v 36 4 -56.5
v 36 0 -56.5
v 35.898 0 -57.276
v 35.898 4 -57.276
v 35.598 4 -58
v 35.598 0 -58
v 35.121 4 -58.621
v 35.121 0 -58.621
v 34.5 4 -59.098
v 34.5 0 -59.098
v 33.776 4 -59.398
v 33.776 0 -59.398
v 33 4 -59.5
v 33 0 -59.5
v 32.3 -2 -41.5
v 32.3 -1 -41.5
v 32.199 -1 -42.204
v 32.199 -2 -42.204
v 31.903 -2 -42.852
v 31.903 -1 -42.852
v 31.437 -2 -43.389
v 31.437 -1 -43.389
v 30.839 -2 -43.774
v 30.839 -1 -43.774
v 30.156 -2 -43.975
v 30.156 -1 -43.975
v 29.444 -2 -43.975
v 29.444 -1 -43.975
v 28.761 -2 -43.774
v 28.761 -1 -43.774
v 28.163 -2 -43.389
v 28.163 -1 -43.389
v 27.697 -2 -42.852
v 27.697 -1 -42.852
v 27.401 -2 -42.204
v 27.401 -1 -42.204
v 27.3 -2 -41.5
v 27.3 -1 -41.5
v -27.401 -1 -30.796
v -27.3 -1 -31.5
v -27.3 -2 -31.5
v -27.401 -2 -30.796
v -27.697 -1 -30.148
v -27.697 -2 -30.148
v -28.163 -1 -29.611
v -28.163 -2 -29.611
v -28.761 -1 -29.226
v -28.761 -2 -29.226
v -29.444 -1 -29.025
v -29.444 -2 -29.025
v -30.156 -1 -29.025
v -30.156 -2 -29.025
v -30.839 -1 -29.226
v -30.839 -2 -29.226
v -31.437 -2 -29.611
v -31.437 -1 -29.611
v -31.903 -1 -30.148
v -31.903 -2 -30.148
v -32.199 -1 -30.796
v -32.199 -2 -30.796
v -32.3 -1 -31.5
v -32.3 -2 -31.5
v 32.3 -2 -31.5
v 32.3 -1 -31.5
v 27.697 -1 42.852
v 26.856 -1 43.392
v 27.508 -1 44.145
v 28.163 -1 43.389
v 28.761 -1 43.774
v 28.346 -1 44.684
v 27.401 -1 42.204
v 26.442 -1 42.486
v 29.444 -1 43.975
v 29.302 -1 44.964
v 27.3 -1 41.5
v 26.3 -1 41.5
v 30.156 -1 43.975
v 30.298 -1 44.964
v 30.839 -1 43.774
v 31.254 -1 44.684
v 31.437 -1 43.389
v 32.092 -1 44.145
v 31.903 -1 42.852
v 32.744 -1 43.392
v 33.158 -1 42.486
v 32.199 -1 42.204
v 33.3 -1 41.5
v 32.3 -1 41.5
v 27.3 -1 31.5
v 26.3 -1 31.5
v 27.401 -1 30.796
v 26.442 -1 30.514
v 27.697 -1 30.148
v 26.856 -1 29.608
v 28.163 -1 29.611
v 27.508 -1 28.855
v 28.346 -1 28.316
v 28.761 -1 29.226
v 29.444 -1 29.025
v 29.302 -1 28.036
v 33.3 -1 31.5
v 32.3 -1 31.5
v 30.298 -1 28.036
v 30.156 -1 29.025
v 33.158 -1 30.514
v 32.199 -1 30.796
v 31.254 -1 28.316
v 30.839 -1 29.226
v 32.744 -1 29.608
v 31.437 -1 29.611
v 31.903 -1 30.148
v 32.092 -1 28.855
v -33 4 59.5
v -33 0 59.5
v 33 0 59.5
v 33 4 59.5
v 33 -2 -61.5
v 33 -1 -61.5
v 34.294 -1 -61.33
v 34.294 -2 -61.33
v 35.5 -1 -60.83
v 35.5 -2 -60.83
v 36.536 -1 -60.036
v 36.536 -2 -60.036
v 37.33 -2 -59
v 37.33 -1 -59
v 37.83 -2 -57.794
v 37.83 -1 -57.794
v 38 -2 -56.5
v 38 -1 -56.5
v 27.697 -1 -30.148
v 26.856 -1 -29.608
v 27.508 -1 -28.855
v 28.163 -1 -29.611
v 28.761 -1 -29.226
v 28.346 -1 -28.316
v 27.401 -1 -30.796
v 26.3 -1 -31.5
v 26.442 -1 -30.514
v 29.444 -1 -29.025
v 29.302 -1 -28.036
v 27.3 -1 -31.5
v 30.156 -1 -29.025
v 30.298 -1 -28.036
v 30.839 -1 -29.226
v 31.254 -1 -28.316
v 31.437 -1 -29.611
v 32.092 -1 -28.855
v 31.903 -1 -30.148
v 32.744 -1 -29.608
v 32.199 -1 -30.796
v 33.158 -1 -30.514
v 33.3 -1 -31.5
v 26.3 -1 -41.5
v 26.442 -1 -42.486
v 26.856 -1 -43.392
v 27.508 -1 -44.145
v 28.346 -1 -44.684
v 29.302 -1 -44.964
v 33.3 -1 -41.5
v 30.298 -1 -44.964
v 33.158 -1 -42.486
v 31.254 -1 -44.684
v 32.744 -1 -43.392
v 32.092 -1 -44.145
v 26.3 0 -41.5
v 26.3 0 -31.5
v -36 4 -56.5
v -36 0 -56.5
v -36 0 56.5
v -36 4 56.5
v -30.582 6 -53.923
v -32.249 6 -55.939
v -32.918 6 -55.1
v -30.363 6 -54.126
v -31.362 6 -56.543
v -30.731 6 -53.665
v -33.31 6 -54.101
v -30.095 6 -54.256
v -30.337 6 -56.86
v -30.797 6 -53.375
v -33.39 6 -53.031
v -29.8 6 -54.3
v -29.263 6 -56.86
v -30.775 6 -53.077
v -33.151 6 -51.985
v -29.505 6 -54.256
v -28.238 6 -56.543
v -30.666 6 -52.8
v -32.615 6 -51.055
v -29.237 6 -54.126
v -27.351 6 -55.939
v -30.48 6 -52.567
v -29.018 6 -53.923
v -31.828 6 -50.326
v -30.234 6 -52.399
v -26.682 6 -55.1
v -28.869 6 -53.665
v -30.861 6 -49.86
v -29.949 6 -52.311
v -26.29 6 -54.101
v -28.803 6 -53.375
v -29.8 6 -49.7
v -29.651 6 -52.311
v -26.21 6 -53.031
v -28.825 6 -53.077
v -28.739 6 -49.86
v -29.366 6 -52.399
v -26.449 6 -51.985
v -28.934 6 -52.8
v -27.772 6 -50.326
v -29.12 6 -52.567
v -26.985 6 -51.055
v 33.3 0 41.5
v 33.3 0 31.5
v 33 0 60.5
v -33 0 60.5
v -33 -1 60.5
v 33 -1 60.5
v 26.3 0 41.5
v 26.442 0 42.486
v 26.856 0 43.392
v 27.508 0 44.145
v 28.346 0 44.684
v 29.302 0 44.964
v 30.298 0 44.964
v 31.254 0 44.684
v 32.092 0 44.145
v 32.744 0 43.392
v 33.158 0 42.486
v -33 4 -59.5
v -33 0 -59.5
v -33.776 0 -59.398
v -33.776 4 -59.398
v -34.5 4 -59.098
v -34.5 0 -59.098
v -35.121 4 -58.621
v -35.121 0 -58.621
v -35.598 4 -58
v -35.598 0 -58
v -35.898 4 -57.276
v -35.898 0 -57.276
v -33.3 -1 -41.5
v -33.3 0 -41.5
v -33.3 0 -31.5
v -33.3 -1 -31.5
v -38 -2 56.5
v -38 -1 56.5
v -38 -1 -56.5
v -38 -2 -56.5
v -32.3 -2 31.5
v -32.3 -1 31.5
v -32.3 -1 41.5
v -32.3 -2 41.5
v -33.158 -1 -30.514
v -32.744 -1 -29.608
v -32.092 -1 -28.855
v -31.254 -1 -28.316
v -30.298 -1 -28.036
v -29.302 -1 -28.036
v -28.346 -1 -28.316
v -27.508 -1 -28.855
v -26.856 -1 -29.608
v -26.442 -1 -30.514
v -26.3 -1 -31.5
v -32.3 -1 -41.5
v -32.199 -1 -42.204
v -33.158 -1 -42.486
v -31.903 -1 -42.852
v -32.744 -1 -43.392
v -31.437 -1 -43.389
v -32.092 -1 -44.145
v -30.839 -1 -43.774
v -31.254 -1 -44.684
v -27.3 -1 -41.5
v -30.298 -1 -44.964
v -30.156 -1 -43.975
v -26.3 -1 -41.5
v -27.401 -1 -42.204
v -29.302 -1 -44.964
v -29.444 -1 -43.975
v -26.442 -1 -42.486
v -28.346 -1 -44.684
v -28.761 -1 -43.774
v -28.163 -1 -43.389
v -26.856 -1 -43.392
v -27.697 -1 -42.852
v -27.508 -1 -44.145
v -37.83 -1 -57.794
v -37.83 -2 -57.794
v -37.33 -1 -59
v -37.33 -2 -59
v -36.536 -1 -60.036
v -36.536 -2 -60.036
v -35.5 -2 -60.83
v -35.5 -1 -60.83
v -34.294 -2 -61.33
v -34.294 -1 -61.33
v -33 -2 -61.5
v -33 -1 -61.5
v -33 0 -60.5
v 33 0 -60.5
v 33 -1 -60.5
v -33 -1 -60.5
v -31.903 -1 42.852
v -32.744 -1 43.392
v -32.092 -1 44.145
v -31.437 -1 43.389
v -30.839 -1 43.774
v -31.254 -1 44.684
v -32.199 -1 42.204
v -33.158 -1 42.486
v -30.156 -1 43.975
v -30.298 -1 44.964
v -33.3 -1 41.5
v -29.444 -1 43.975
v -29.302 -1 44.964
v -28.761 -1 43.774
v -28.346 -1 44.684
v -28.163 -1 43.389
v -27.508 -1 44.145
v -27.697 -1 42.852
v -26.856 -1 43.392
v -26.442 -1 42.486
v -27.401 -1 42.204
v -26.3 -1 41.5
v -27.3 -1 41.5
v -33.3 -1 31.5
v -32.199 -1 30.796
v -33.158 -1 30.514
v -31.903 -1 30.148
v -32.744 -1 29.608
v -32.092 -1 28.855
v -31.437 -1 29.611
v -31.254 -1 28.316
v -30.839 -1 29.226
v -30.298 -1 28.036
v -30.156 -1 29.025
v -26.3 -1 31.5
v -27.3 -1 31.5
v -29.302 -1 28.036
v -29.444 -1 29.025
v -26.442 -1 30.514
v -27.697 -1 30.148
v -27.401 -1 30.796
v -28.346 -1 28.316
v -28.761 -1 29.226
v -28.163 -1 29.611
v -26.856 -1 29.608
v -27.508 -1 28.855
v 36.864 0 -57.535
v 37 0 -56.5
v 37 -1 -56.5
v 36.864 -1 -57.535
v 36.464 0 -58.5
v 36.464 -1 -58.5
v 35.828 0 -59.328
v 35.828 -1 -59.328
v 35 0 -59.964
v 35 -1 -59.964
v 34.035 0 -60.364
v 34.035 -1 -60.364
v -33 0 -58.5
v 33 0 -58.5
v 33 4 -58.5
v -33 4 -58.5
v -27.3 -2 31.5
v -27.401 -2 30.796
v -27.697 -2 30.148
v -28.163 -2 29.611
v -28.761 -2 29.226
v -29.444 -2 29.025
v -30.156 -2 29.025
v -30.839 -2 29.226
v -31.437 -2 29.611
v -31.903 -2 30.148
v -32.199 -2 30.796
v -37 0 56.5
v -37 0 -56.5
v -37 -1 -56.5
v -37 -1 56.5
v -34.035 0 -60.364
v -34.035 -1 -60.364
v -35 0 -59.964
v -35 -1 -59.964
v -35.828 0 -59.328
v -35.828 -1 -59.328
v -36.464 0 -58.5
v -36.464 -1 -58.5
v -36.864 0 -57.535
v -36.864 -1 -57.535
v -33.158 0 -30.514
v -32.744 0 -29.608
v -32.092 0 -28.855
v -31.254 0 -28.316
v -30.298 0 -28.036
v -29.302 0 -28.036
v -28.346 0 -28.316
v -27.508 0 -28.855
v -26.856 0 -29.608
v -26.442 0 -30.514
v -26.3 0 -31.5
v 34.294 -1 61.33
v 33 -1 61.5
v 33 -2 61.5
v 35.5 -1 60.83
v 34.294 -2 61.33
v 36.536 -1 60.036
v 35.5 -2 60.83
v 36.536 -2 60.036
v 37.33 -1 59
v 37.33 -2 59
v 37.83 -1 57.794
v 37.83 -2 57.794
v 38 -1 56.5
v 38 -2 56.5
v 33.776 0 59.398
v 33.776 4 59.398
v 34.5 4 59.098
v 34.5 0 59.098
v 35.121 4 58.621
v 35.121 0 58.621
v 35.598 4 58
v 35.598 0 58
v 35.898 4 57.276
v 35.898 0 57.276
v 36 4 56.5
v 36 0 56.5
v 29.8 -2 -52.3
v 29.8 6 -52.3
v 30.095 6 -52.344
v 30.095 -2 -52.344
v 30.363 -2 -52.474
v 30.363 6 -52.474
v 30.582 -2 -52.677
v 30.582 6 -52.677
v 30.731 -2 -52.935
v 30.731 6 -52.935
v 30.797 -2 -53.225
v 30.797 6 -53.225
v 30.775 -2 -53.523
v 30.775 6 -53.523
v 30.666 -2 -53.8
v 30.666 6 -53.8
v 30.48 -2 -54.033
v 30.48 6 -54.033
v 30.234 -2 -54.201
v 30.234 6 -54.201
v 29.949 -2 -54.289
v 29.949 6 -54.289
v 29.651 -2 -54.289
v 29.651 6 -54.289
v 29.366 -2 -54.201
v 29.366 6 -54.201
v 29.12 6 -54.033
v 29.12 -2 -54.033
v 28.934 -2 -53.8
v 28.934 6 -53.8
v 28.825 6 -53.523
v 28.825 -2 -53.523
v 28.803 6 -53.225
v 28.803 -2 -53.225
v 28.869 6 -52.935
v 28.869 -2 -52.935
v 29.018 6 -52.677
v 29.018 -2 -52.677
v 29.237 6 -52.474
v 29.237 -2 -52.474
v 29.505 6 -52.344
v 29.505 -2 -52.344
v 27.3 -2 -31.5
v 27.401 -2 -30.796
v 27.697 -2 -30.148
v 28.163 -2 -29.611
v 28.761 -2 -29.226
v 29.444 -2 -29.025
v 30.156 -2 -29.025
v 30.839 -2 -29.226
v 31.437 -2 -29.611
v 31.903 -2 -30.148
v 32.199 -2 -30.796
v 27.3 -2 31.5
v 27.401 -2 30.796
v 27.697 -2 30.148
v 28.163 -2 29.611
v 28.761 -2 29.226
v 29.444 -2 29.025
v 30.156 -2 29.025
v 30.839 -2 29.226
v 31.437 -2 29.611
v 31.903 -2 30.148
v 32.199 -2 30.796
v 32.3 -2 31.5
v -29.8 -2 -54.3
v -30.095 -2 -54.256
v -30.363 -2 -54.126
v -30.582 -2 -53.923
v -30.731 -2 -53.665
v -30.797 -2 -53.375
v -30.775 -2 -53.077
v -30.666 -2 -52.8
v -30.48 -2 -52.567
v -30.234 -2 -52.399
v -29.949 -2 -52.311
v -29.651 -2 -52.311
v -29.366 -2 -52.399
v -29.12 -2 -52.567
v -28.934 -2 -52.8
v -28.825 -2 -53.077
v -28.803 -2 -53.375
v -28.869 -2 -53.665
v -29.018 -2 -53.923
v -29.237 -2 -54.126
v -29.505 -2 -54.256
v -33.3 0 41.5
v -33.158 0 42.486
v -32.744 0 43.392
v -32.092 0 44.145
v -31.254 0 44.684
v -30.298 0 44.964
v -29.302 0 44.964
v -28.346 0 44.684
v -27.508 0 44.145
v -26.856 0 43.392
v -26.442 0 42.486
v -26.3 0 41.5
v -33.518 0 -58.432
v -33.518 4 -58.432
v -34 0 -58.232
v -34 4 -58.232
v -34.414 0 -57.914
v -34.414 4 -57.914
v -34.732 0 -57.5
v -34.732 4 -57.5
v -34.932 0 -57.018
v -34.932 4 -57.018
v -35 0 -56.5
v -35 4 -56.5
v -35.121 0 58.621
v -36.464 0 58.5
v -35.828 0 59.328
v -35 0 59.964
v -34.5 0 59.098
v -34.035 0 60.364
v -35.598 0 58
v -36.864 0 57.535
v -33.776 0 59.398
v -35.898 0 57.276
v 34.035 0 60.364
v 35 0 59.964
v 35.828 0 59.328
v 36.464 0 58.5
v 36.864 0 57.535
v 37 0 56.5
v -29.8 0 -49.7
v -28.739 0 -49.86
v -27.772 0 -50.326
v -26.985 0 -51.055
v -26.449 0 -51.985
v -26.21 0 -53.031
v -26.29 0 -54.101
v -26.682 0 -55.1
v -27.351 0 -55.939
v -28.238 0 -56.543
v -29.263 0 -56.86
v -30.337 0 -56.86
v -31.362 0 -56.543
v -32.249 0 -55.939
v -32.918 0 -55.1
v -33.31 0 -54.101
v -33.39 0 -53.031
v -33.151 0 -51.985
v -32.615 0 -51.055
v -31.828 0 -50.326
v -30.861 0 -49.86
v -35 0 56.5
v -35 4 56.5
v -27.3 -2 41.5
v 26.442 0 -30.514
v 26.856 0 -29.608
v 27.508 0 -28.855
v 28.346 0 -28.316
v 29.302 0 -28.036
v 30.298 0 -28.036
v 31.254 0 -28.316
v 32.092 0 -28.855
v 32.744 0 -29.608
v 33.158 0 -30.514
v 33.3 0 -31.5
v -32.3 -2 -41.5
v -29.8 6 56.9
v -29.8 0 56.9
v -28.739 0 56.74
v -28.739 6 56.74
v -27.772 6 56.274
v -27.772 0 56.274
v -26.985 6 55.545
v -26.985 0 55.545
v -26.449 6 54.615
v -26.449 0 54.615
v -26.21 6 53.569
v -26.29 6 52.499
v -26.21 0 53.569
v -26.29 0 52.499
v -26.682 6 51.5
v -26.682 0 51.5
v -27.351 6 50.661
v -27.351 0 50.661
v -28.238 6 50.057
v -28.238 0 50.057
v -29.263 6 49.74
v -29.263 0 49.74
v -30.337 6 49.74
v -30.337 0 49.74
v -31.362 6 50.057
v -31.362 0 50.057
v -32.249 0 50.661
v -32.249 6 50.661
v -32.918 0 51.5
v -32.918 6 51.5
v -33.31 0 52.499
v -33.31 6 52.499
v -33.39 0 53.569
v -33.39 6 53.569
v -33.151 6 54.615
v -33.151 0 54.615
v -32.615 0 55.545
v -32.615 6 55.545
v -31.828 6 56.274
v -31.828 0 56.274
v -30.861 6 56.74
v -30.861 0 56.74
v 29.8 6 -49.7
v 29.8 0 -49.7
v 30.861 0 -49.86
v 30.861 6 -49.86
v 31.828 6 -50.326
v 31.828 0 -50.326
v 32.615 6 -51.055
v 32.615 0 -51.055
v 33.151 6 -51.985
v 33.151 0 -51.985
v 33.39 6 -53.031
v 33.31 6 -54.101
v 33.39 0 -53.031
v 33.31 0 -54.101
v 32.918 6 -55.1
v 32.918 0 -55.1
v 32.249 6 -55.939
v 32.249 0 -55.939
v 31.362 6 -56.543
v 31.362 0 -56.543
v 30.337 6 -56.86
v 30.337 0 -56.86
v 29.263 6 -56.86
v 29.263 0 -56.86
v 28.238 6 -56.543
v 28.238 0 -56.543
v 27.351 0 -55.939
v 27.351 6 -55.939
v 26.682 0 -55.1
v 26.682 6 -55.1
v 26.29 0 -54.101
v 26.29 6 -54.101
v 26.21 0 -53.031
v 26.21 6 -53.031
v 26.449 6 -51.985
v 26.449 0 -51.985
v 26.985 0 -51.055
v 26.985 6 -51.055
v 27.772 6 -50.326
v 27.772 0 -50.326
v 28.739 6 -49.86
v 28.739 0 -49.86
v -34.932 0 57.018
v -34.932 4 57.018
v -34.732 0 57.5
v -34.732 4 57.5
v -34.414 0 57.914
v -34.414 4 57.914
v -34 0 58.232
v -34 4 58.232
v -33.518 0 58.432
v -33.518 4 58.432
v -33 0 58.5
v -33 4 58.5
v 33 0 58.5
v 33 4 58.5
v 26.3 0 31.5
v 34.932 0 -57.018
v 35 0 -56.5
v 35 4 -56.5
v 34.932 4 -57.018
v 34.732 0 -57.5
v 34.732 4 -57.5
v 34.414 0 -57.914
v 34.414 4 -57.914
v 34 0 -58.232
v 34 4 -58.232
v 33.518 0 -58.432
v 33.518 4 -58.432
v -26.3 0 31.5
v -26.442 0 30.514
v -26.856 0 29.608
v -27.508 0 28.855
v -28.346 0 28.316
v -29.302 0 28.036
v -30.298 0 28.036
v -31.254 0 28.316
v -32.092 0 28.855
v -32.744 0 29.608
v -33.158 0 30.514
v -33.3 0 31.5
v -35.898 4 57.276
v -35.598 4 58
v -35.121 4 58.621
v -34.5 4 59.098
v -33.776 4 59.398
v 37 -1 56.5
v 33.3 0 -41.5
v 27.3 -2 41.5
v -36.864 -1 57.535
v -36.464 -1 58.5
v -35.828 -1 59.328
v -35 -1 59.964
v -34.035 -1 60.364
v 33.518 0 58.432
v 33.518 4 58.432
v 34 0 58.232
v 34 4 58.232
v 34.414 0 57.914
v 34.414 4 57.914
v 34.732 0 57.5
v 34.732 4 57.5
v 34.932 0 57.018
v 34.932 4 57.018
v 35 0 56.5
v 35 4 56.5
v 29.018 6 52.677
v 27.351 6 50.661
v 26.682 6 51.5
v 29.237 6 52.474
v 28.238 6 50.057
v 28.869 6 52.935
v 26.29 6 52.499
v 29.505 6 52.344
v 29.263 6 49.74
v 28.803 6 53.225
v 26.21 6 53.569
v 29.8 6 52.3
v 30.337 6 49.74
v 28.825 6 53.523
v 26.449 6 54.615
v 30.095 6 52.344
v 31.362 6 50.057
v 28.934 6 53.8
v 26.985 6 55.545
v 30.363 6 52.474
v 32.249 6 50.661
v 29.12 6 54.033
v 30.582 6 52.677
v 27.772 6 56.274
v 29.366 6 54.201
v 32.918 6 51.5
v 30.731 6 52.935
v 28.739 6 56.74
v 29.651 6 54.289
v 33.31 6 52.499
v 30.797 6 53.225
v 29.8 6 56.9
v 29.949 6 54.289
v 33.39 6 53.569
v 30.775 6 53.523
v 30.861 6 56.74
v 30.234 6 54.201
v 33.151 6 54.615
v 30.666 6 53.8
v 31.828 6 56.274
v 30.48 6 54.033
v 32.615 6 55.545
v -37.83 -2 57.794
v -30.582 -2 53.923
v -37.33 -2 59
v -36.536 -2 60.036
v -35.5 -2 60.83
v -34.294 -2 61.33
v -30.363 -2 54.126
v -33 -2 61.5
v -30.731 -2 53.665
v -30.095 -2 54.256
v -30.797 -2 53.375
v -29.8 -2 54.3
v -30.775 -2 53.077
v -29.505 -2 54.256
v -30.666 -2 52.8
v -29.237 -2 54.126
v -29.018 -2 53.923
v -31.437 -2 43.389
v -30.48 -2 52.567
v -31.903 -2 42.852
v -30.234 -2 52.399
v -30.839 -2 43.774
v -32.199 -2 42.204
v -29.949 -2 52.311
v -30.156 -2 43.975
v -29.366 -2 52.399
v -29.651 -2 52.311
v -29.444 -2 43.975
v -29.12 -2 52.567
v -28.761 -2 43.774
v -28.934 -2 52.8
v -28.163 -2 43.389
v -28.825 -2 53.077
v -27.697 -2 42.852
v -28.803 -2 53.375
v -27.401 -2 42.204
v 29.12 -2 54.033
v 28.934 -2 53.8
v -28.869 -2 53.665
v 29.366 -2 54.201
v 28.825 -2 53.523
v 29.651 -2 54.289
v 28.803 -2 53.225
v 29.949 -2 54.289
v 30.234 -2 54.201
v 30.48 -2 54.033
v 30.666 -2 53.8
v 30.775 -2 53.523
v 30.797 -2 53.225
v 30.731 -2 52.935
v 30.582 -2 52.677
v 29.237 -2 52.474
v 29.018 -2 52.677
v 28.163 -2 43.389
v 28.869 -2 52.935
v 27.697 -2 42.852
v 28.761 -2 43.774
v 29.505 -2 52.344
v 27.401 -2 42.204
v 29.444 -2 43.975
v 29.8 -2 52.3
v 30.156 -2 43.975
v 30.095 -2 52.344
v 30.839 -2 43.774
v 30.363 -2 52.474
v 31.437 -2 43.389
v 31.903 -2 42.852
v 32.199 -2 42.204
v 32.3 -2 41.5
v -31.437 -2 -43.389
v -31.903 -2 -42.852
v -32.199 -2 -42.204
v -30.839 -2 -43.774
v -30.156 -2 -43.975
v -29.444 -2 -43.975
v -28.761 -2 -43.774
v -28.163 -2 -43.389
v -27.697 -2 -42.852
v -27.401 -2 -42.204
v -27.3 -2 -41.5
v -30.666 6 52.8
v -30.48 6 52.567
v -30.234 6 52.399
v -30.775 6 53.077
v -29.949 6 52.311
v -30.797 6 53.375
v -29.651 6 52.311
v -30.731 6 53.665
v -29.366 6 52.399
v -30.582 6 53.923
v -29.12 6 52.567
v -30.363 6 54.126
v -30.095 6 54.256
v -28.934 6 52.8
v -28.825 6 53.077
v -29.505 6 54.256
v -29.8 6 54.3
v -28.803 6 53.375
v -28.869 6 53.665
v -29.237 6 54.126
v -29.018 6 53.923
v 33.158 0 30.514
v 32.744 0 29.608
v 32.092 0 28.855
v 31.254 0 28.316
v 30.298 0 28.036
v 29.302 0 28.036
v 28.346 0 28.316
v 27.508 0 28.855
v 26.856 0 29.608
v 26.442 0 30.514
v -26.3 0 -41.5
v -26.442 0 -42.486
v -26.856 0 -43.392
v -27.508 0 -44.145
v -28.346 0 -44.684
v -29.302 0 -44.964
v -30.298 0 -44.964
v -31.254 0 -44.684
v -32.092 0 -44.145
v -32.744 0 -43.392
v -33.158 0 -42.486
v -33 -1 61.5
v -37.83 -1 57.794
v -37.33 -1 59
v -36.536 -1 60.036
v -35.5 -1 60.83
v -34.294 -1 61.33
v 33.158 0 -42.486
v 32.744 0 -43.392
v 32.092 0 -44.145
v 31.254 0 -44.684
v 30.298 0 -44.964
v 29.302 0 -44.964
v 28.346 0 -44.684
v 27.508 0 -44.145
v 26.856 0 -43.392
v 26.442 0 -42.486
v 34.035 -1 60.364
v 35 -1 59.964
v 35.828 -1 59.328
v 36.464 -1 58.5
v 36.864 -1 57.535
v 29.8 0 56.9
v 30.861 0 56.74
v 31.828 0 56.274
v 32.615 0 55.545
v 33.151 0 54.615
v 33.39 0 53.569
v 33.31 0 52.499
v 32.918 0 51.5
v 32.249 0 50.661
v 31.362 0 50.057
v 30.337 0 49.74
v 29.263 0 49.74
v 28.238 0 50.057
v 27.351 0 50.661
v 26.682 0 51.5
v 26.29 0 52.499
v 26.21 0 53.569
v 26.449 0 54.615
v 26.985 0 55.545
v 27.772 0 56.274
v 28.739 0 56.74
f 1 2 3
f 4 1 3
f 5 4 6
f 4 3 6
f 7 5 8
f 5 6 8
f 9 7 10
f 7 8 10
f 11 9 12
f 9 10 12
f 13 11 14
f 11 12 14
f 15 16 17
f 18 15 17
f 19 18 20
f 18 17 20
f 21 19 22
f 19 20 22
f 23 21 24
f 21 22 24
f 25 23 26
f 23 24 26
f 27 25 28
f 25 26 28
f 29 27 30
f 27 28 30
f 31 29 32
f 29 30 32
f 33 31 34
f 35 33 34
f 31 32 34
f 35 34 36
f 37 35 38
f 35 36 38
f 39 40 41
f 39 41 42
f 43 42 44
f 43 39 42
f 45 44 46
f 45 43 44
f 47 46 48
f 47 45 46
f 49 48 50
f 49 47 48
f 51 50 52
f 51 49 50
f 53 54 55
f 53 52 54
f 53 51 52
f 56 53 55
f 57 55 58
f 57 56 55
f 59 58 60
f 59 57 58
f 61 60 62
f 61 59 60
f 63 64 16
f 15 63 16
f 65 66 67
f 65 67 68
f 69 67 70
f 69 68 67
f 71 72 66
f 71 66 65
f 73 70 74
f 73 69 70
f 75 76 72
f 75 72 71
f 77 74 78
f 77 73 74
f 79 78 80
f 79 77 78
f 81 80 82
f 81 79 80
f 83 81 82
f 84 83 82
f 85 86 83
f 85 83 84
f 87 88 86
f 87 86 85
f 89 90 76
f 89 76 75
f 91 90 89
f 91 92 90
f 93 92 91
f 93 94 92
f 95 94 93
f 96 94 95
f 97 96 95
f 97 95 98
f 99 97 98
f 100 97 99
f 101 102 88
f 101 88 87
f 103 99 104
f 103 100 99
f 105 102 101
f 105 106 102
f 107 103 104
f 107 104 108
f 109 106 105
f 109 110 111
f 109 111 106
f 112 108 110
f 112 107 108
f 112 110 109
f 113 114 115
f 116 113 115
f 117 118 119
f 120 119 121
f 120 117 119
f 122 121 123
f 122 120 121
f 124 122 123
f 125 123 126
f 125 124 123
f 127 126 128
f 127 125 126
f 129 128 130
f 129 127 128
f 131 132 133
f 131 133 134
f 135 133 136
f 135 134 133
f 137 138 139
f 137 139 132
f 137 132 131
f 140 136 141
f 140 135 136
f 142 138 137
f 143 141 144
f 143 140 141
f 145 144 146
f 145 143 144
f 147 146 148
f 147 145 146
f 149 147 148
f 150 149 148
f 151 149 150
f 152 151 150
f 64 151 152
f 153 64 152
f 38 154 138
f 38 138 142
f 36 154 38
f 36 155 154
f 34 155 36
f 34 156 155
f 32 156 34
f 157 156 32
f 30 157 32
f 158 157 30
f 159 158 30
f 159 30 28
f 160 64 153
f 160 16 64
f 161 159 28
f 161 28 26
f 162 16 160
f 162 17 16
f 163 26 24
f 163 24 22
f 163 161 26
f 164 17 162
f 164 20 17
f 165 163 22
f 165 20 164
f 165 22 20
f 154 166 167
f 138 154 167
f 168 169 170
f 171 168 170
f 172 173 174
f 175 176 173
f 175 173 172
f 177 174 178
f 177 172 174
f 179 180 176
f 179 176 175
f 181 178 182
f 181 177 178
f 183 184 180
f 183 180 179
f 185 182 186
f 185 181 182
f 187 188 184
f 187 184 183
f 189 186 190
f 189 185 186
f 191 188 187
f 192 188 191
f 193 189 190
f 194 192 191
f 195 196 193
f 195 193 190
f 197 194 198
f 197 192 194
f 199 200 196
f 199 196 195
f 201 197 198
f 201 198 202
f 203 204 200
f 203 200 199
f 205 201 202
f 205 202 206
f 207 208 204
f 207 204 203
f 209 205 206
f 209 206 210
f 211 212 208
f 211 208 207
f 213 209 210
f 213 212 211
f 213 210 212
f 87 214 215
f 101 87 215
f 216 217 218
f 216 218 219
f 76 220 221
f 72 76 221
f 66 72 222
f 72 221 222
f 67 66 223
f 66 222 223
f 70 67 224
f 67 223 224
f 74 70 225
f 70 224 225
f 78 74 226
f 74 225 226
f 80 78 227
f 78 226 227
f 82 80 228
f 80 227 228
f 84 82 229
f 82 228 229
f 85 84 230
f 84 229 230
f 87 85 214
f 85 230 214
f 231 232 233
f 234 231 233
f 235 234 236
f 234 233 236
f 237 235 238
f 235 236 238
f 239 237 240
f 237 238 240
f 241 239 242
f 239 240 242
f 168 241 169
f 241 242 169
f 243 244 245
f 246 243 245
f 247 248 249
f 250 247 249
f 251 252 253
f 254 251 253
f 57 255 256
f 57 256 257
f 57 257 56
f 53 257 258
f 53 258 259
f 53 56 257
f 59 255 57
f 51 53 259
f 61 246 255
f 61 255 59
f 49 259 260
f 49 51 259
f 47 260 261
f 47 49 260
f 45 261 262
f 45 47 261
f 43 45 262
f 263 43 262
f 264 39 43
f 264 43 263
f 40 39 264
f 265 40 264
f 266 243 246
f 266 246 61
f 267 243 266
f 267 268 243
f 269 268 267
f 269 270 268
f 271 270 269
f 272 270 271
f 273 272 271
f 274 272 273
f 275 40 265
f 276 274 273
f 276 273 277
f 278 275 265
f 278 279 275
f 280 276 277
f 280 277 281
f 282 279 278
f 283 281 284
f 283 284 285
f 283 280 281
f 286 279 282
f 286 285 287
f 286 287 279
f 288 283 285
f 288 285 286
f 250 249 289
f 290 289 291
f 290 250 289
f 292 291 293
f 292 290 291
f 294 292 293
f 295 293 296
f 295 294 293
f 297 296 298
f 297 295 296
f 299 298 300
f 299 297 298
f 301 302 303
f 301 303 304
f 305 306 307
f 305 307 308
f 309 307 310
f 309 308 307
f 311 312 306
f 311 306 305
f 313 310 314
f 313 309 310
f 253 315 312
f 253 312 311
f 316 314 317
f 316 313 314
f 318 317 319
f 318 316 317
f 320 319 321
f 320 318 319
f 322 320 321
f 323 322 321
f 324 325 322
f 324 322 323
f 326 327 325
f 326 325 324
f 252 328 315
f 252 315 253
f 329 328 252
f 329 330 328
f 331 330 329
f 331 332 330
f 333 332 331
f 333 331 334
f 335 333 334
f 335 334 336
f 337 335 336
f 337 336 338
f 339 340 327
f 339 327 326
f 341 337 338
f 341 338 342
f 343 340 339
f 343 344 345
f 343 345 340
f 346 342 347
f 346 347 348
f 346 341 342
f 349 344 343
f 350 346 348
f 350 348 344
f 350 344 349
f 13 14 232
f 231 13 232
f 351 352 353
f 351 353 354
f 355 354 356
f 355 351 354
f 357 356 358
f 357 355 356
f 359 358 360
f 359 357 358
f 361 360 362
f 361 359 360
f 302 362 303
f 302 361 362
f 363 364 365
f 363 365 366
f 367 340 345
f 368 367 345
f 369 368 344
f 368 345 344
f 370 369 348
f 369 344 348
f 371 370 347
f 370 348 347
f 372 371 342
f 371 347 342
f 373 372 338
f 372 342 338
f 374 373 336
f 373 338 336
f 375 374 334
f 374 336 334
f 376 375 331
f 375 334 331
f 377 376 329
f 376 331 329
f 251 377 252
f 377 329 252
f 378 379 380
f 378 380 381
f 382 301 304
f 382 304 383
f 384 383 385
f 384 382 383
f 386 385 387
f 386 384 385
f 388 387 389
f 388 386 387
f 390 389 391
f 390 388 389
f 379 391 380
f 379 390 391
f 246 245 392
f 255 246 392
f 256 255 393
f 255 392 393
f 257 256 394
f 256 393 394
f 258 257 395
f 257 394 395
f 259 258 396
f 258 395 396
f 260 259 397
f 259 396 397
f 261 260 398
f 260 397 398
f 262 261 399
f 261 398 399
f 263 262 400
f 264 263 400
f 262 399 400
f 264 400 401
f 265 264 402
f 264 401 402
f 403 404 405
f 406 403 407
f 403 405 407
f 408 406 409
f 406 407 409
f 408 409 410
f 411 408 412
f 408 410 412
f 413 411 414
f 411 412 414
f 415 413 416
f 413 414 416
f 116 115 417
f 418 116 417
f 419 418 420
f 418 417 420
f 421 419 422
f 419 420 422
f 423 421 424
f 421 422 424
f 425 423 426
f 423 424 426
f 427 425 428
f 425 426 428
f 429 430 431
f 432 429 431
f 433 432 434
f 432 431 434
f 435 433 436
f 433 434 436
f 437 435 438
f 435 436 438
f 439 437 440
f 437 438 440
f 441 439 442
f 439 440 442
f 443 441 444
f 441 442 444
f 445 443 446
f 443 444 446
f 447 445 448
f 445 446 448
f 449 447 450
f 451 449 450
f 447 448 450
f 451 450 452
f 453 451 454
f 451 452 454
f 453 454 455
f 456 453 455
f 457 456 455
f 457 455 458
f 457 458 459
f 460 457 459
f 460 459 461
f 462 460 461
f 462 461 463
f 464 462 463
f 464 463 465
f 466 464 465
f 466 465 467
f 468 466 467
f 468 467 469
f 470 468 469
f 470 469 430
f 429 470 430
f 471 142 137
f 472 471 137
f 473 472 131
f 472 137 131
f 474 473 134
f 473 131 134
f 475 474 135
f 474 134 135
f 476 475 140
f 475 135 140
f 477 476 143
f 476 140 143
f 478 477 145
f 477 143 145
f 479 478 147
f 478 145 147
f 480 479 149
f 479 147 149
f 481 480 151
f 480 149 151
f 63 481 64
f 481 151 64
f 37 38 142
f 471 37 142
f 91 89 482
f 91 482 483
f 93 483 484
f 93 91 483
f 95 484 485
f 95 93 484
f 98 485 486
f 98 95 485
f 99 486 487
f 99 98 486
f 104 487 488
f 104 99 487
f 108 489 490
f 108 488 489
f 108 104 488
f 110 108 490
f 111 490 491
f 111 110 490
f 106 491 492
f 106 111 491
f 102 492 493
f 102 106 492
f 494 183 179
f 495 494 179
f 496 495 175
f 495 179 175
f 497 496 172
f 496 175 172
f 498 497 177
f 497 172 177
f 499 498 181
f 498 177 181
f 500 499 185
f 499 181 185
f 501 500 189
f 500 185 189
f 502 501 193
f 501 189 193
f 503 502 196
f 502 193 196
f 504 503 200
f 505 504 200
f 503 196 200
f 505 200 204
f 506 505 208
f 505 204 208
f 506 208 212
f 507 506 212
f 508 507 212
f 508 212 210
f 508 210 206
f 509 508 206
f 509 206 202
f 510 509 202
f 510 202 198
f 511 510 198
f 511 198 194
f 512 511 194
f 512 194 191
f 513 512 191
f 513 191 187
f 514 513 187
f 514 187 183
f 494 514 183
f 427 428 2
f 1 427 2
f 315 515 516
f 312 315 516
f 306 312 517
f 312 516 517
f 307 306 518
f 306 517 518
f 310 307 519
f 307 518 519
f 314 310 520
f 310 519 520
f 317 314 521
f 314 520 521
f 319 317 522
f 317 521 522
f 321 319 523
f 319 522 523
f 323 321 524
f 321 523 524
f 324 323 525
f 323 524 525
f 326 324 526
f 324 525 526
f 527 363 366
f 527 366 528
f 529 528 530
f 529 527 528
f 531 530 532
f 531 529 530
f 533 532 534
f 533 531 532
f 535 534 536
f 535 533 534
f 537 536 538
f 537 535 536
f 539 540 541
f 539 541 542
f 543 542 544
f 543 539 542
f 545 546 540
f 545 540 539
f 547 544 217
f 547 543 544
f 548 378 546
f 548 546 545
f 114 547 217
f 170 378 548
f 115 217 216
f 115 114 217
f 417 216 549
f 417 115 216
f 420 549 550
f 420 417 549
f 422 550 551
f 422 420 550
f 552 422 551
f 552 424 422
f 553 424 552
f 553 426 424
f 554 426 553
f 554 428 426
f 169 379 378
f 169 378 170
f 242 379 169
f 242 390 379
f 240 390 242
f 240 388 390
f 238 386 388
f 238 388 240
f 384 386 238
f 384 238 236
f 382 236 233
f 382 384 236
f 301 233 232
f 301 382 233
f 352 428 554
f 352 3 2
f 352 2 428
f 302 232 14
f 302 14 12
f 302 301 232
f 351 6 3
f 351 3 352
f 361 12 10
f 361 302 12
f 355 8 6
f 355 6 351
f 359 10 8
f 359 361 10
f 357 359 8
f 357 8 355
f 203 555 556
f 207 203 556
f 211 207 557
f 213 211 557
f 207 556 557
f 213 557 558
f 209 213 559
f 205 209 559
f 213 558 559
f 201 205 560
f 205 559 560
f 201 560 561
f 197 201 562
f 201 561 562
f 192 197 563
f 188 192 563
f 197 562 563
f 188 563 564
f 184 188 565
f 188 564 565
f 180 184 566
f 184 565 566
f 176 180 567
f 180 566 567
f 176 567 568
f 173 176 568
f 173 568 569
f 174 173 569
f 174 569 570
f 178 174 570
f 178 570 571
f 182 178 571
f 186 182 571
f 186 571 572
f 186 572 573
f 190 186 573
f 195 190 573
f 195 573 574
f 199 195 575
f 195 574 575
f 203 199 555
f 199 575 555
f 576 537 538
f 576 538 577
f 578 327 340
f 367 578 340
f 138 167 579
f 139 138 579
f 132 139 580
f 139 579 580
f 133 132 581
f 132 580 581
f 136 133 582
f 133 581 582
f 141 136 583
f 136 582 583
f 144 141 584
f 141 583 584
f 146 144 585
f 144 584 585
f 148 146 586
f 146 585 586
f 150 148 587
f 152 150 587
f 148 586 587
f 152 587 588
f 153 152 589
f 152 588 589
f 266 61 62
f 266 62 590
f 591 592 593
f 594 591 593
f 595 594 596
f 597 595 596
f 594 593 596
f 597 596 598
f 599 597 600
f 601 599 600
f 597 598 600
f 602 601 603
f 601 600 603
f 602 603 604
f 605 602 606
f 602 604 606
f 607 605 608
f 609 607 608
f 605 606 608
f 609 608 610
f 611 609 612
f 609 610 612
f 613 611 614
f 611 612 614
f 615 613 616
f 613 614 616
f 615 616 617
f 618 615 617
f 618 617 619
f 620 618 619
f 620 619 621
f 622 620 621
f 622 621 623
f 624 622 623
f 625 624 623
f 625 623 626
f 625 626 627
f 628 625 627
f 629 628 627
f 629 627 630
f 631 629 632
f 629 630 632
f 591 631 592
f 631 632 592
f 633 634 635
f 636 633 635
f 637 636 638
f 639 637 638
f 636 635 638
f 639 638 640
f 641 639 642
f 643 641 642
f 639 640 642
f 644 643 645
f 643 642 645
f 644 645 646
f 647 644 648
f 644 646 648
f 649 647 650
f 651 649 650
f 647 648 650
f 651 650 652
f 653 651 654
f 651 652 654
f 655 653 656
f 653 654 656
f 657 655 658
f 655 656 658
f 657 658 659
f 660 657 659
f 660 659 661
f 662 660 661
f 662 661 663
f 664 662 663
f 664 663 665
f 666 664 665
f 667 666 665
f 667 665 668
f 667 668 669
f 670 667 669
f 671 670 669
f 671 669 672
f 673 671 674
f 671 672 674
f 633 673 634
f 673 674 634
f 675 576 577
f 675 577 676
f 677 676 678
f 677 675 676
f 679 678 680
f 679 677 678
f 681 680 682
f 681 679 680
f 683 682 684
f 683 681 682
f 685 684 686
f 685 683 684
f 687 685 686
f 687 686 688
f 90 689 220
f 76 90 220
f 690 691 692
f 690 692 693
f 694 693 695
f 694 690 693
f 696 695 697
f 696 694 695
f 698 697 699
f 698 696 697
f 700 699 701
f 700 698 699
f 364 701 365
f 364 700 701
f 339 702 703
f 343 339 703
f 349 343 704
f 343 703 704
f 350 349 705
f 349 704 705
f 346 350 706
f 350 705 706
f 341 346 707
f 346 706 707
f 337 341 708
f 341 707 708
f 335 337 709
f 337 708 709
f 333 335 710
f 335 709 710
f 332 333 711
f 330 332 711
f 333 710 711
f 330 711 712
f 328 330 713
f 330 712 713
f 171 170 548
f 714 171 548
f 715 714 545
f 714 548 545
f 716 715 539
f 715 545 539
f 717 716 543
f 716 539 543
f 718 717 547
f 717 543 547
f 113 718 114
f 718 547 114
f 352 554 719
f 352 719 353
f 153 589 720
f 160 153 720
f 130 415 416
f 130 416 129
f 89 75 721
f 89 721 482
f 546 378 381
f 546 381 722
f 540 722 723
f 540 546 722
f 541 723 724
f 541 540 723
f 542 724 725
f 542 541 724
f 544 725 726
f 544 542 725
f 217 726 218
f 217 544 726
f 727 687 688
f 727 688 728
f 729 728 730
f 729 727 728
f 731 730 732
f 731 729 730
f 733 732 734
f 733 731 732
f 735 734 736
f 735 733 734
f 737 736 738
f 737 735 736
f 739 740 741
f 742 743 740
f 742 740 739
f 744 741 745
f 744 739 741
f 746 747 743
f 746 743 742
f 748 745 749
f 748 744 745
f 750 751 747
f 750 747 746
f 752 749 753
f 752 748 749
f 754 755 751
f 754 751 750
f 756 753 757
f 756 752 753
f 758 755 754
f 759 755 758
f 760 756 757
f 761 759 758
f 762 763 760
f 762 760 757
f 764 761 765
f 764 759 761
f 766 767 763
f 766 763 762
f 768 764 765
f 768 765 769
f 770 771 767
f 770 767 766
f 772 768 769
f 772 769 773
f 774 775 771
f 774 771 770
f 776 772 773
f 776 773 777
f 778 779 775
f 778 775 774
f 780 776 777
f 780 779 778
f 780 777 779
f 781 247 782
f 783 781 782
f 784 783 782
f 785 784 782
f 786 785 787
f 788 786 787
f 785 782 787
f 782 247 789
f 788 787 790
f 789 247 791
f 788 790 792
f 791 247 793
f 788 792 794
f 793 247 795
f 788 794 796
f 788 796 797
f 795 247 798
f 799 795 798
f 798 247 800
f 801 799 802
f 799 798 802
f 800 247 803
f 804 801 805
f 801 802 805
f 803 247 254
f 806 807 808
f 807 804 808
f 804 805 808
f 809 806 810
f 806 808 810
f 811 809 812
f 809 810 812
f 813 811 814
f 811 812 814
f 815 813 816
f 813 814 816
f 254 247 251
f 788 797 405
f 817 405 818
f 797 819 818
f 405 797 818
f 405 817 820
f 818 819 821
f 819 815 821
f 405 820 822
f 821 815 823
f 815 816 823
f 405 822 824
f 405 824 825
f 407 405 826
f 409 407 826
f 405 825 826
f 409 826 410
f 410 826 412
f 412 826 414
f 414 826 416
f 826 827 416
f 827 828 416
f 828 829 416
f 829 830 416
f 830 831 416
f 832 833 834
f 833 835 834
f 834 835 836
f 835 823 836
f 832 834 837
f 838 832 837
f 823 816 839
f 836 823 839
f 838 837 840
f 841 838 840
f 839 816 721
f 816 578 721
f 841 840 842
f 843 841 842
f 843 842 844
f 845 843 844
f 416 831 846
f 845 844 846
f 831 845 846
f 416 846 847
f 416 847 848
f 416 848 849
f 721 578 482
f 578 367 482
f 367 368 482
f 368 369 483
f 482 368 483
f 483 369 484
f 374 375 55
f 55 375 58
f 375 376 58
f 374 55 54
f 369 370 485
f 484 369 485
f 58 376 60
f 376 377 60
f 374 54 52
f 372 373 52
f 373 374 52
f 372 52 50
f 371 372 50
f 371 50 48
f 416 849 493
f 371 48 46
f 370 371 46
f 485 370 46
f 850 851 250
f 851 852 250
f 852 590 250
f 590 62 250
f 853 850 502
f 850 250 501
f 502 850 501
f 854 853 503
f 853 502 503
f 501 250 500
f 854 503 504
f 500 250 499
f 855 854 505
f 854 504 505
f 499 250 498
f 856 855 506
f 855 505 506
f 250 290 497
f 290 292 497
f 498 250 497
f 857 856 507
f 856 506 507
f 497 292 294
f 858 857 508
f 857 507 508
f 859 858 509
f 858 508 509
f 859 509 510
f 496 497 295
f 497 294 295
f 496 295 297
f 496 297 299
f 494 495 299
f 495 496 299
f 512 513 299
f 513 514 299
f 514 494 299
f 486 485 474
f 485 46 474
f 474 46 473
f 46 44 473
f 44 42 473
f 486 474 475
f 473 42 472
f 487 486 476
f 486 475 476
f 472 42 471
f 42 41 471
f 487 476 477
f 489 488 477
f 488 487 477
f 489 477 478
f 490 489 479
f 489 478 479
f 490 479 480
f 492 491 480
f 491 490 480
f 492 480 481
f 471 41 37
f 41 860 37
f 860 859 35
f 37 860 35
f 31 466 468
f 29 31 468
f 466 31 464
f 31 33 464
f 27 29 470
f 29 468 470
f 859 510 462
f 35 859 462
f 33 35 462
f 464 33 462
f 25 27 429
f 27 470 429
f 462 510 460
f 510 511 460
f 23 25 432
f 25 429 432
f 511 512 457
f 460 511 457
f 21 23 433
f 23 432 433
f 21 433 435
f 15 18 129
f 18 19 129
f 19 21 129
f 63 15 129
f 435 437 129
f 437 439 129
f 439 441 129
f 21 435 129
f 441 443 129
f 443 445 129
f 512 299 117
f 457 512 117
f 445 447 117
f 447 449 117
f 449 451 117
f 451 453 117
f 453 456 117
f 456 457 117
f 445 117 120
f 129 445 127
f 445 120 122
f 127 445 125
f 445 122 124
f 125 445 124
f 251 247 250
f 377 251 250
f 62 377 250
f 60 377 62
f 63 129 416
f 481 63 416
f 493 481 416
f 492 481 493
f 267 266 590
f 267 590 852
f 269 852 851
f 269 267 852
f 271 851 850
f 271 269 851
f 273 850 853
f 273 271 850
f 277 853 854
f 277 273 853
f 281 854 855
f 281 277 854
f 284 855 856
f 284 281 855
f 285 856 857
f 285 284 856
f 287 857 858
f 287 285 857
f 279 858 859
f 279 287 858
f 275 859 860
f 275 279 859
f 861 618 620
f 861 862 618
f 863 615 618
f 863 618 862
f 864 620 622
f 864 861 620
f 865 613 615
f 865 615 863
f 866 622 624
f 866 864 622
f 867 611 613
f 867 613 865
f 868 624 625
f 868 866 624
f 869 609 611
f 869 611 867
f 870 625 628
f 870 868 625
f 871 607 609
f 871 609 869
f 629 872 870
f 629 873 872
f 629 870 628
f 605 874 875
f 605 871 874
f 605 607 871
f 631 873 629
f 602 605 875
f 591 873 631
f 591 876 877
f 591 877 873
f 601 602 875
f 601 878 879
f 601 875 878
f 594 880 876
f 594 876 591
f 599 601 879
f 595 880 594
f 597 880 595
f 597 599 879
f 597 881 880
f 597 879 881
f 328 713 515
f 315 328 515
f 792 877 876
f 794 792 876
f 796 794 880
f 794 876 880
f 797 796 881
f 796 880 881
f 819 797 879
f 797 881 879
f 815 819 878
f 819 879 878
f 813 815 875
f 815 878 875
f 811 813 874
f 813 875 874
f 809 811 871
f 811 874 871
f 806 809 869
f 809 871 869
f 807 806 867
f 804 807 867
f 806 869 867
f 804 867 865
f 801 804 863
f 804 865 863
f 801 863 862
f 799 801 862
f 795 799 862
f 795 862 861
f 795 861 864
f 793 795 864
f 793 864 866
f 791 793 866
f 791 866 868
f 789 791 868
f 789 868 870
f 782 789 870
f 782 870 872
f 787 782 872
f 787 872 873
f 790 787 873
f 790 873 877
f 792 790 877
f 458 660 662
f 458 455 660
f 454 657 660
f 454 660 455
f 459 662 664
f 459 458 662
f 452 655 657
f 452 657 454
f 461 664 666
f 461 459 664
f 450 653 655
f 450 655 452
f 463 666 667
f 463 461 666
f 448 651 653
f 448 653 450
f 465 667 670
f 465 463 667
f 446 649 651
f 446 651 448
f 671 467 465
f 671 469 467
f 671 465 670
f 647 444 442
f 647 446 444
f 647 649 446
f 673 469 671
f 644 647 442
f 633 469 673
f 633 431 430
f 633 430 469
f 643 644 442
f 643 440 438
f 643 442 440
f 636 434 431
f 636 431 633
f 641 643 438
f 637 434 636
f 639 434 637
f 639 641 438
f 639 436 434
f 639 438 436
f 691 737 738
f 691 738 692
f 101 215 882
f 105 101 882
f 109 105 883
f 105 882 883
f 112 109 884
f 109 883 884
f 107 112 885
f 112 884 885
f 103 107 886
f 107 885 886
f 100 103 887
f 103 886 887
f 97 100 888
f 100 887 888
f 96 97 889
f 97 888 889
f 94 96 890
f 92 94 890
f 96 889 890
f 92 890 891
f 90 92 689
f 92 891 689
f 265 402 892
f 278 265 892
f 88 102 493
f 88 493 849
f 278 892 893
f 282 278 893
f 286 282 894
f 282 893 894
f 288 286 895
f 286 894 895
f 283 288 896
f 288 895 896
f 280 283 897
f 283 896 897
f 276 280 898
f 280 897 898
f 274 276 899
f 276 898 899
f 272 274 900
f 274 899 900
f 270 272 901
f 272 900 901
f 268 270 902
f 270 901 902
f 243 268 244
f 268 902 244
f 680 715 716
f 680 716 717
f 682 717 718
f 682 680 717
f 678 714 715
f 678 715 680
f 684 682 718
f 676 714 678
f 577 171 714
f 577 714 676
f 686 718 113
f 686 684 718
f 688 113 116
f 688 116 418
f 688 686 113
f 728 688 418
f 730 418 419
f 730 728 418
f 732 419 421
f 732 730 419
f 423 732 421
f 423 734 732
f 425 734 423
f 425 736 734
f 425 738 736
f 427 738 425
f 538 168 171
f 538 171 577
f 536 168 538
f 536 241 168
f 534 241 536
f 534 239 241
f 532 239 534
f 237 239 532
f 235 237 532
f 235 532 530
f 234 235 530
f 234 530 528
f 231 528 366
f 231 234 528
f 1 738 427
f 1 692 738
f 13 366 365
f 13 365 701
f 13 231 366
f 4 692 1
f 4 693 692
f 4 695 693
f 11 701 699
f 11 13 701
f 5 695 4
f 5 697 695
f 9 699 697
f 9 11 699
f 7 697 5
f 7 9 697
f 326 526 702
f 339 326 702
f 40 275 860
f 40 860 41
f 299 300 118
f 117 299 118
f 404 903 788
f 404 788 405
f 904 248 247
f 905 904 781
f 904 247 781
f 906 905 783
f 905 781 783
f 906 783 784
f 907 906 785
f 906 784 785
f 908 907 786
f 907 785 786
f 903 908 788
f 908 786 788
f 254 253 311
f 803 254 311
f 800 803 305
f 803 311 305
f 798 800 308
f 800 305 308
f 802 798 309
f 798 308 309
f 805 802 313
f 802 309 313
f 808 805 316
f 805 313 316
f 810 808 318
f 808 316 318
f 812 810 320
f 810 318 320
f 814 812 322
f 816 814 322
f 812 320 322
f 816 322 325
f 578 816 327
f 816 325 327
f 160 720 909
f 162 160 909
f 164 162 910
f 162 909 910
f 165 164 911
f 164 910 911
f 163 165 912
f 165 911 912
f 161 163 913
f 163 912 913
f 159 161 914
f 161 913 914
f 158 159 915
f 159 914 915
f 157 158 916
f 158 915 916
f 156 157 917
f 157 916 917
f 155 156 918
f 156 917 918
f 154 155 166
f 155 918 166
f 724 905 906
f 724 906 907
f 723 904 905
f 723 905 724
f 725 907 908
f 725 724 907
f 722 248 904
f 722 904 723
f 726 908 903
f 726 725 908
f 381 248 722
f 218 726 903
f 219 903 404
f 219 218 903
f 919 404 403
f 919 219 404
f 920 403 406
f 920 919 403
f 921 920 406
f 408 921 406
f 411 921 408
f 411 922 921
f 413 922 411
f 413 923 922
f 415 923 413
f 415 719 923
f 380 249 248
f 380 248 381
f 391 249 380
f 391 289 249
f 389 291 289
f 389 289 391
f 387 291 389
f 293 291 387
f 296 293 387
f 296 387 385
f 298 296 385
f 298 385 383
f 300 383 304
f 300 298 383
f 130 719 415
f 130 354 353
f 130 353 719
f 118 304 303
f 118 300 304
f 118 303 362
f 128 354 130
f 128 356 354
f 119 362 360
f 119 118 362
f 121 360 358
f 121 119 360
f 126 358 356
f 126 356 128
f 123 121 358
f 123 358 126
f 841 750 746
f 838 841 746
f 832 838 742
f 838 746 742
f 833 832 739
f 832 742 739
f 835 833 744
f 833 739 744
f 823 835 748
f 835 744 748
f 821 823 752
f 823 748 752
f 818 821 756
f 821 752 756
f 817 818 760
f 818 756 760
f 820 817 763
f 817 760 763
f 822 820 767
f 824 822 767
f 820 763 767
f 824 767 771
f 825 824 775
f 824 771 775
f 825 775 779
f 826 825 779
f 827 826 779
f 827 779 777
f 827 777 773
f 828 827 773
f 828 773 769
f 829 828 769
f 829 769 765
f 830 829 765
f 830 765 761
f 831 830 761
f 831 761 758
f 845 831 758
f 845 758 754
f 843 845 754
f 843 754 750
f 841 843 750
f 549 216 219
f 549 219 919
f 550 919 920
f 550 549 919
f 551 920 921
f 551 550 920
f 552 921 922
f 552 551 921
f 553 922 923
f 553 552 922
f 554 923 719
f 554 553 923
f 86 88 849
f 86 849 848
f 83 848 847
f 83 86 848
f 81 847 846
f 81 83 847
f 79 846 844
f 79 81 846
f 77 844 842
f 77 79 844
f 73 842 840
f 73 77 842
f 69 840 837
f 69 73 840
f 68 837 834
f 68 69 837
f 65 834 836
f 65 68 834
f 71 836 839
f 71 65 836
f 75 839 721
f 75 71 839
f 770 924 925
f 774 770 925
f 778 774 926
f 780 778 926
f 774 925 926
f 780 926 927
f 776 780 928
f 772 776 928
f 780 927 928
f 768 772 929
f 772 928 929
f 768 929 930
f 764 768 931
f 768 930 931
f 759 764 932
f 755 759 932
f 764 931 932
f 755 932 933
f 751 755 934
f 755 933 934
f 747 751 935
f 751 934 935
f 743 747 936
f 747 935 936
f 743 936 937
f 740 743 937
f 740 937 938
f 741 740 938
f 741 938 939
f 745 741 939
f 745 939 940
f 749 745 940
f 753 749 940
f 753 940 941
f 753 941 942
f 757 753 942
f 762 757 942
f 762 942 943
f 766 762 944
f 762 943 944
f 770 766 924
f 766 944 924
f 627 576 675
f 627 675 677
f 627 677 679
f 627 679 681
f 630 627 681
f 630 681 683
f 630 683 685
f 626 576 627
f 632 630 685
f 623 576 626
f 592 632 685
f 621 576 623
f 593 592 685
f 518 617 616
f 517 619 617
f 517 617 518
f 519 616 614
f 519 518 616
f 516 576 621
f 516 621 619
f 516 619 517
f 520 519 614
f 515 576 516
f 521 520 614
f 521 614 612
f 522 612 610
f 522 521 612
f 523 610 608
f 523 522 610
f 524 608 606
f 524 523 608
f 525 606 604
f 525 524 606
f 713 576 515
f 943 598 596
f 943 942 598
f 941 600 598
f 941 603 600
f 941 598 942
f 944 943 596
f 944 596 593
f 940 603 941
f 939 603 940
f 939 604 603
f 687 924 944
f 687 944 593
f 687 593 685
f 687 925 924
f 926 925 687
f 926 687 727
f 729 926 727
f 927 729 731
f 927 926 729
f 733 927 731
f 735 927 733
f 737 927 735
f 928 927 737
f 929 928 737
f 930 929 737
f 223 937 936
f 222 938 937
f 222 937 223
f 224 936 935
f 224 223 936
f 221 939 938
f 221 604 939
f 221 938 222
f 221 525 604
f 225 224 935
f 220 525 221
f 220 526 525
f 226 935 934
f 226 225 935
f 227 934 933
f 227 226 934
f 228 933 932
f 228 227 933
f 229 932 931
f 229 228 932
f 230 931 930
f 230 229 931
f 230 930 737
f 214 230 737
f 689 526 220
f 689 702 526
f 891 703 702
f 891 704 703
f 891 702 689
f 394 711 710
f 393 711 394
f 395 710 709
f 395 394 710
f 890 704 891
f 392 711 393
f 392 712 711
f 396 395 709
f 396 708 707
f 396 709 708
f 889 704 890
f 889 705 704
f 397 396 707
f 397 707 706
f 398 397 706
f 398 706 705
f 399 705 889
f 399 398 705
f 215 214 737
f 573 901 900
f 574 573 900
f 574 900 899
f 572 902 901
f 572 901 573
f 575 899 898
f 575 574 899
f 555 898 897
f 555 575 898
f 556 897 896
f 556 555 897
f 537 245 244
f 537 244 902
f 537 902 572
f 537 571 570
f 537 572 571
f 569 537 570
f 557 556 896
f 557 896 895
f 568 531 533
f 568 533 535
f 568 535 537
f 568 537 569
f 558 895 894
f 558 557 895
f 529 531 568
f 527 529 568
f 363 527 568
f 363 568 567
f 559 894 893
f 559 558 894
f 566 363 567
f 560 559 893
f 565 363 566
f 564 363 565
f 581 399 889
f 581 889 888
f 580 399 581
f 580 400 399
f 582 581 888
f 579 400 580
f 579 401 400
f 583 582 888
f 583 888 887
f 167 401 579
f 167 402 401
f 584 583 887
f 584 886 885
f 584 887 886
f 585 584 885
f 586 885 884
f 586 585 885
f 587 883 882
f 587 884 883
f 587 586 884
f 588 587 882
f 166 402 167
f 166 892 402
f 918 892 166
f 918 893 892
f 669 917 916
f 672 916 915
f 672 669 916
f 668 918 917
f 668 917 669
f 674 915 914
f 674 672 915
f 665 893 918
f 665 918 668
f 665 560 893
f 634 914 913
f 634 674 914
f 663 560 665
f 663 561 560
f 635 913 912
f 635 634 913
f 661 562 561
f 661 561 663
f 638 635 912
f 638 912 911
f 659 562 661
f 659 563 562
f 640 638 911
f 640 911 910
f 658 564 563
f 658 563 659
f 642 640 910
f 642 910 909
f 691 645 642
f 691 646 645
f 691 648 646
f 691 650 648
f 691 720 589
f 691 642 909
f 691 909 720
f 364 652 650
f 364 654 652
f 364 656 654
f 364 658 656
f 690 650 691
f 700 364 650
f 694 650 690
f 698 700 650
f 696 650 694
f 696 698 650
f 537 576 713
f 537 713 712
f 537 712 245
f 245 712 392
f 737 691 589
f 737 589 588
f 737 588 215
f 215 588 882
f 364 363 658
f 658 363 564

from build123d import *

# Parameters (mm, degrees)
SKETCH1_W           = 76
SKETCH1_H           = 123
BOSS_EXTRUDE2_DEPTH = 2
SKETCH1_4_R         = 3.6
BOSS_EXTRUDE3_DEPTH = 6
FILLET1_R           = 5
CUT_EXTRUDE1_DEPTH  = 73.541367508
SKETCH3_R           = 1
CUT_EXTRUDE2_DEPTH  = 73.734104793
CUT_EXTRUDE4_DEPTH  = 1
BOSS_EXTRUDE4_DEPTH = 4


with BuildPart() as part:
    # Sketch1 → Boss-Extrude2 (new body)
    with BuildSketch(Plane(origin=(0, 0, 0), x_dir=(1, 0, 0), z_dir=(0, 1, 0))):
        Rectangle(SKETCH1_W, SKETCH1_H)
    extrude(amount=-BOSS_EXTRUDE2_DEPTH)

    # Sketch1<4> → Boss-Extrude3 (add)
    with BuildSketch(Plane(origin=(0, 0, 0), x_dir=(1, 0, 0), z_dir=(0, 1, 0))):
        with Locations((-29.8, 53.3)):
            Circle(SKETCH1_4_R)
        with Locations((29.8, 53.3)):
            Circle(SKETCH1_4_R)
        with Locations((29.8, -53.3)):
            Circle(SKETCH1_4_R)
        with Locations((-29.8, -53.3)):
            Circle(SKETCH1_4_R)
    extrude(amount=BOSS_EXTRUDE3_DEPTH)

    # Fillet1
    fillet1_edges = [part.edges().sort_by_distance(p)[0] for p in [
        (-38, -1, -61.5),
        (38, -1, -61.5),
        (38, -1, 61.5),
        (-38, -1, 61.5),
    ]]
    fillet(fillet1_edges, radius=FILLET1_R)

    # Sketch2 → Cut-Extrude1 (cut, through all)
    with BuildSketch(Plane(origin=(0, 0, 0), x_dir=(1, 0, 0), z_dir=(0, 1, 0))):
        with BuildLine():
            Line((-27.3, 41.5), (-27.3, 31.5))
            ThreePointArc((-27.3, 31.5), (-29.8, 29), (-32.3, 31.5))
            Line((-32.3, 31.5), (-32.3, 41.5))
            ThreePointArc((-32.3, 41.5), (-29.8, 44), (-27.3, 41.5))
        make_face()
        with BuildLine():
            Line((27.3, 41.5), (27.3, 31.5))
            ThreePointArc((27.3, 31.5), (29.8, 29), (32.3, 31.5))
            Line((32.3, 31.5), (32.3, 41.5))
            ThreePointArc((32.3, 41.5), (29.8, 44), (27.3, 41.5))
        make_face()
        with BuildLine():
            Line((-27.3, -41.5), (-27.3, -31.5))
            ThreePointArc((-27.3, -31.5), (-29.8, -29), (-32.3, -31.5))
            Line((-32.3, -31.5), (-32.3, -41.5))
            ThreePointArc((-32.3, -41.5), (-29.8, -44), (-27.3, -41.5))
        make_face()
        with BuildLine():
            Line((27.3, -41.5), (27.3, -31.5))
            ThreePointArc((27.3, -31.5), (29.8, -29), (32.3, -31.5))
            Line((32.3, -31.5), (32.3, -41.5))
            ThreePointArc((32.3, -41.5), (29.8, -44), (27.3, -41.5))
        make_face()
    extrude(amount=-CUT_EXTRUDE1_DEPTH, mode=Mode.SUBTRACT)

    # Sketch3 → Cut-Extrude2 (cut, through all)
    with BuildSketch(Plane(origin=(0, 6, 0), x_dir=(1, 0, 0), z_dir=(0, 1, 0))):
        with Locations((-29.8, -53.3)):
            Circle(SKETCH3_R)
        with Locations((29.8, -53.3)):
            Circle(SKETCH3_R)
        with Locations((29.8, 53.3)):
            Circle(SKETCH3_R)
        with Locations((-29.8, 53.3)):
            Circle(SKETCH3_R)
    extrude(amount=-CUT_EXTRUDE2_DEPTH, mode=Mode.SUBTRACT)

    # Sketch4 → Cut-Extrude4 (cut)
    # profile 1 of 5: a face of its own
    with BuildSketch(Plane(origin=(0, 0, 0), x_dir=(1, 0, 0), z_dir=(0, 1, 0))):
        with BuildLine():
            ThreePointArc((-38, -56.5), (-36.535533906, -60.035533906), (-33, -61.5))
            Line((-33, -61.5), (33, -61.5))
            ThreePointArc((33, -61.5), (36.535533906, -60.035533906), (38, -56.5))
            Line((38, -56.5), (38, 56.5))
            ThreePointArc((38, 56.5), (36.535533906, 60.035533906), (33, 61.5))
            Line((33, 61.5), (-33, 61.5))
            ThreePointArc((-33, 61.5), (-36.535533906, 60.035533906), (-38, 56.5))
            Line((-38, 56.5), (-38, -56.5))
        make_face()
        with BuildLine():
            Line((33, -60.5), (-33, -60.5))
            ThreePointArc((-33, -60.5), (-35.828427125, -59.328427125), (-37, -56.5))
            Line((-37, -56.5), (-37, 56.5))
            ThreePointArc((-37, 56.5), (-35.828427125, 59.328427125), (-33, 60.5))
            Line((-33, 60.5), (33, 60.5))
            ThreePointArc((33, 60.5), (35.828427125, 59.328427125), (37, 56.5))
            Line((37, 56.5), (37, -56.5))
            ThreePointArc((37, -56.5), (35.828427125, -59.328427125), (33, -60.5))
        make_face(mode=Mode.SUBTRACT)
    # profile 2 of 5: a face of its own
    with BuildSketch(Plane(origin=(0, 0, 0), x_dir=(1, 0, 0), z_dir=(0, 1, 0))):
        with BuildLine():
            ThreePointArc((26.3, 31.5), (29.8, 28), (33.3, 31.5))
            Line((33.3, 31.5), (33.3, 41.5))
            ThreePointArc((33.3, 41.5), (29.8, 45), (26.3, 41.5))
            Line((26.3, 41.5), (26.3, 31.5))
        make_face()
        with BuildLine():
            Line((32.3, 41.5), (32.3, 31.5))
            ThreePointArc((32.3, 31.5), (29.8, 29), (27.3, 31.5))
            Line((27.3, 31.5), (27.3, 41.5))
            ThreePointArc((27.3, 41.5), (29.8, 44), (32.3, 41.5))
        make_face(mode=Mode.SUBTRACT)
    # profile 3 of 5: a face of its own
    with BuildSketch(Plane(origin=(0, 0, 0), x_dir=(1, 0, 0), z_dir=(0, 1, 0))):
        with BuildLine():
            ThreePointArc((-33.3, 31.5), (-29.8, 28), (-26.3, 31.5))
            Line((-26.3, 31.5), (-26.3, 41.5))
            ThreePointArc((-26.3, 41.5), (-29.8, 45), (-33.3, 41.5))
            Line((-33.3, 41.5), (-33.3, 31.5))
        make_face()
        with BuildLine():
            Line((-27.3, 41.5), (-27.3, 31.5))
            ThreePointArc((-27.3, 31.5), (-29.8, 29), (-32.3, 31.5))
            Line((-32.3, 31.5), (-32.3, 41.5))
            ThreePointArc((-32.3, 41.5), (-29.8, 44), (-27.3, 41.5))
        make_face(mode=Mode.SUBTRACT)
    # profile 4 of 5: a face of its own
    with BuildSketch(Plane(origin=(0, 0, 0), x_dir=(1, 0, 0), z_dir=(0, 1, 0))):
        with BuildLine():
            ThreePointArc((-26.3, -31.5), (-29.8, -28), (-33.3, -31.5))
            Line((-33.3, -31.5), (-33.3, -41.5))
            ThreePointArc((-33.3, -41.5), (-29.8, -45), (-26.3, -41.5))
            Line((-26.3, -41.5), (-26.3, -31.5))
        make_face()
        with BuildLine():
            Line((-32.3, -41.5), (-32.3, -31.5))
            ThreePointArc((-32.3, -31.5), (-29.8, -29), (-27.3, -31.5))
            Line((-27.3, -31.5), (-27.3, -41.5))
            ThreePointArc((-27.3, -41.5), (-29.8, -44), (-32.3, -41.5))
        make_face(mode=Mode.SUBTRACT)
    # profile 5 of 5: a face of its own
    with BuildSketch(Plane(origin=(0, 0, 0), x_dir=(1, 0, 0), z_dir=(0, 1, 0))):
        with BuildLine():
            ThreePointArc((26.3, -41.5), (29.8, -45), (33.3, -41.5))
            Line((33.3, -41.5), (33.3, -31.5))
            ThreePointArc((33.3, -31.5), (29.8, -28), (26.3, -31.5))
            Line((26.3, -31.5), (26.3, -41.5))
        make_face()
        with BuildLine():
            Line((32.3, -31.5), (32.3, -41.5))
            ThreePointArc((32.3, -41.5), (29.8, -44), (27.3, -41.5))
            Line((27.3, -41.5), (27.3, -31.5))
            ThreePointArc((27.3, -31.5), (29.8, -29), (32.3, -31.5))
        make_face(mode=Mode.SUBTRACT)
    extrude(amount=-CUT_EXTRUDE4_DEPTH, mode=Mode.SUBTRACT)

    # Sketch5 → Boss-Extrude4 (add)
    with BuildSketch(Plane(origin=(0, 0, 0), x_dir=(1, 0, 0), z_dir=(0, 1, 0))):
        with BuildLine():
            Line((-36, 56.5), (-36, -56.5))
            ThreePointArc((-36, -56.5), (-35.121320344, -58.621320344), (-33, -59.5))
            Line((-33, -59.5), (33, -59.5))
            ThreePointArc((33, -59.5), (35.121320344, -58.621320344), (36, -56.5))
            Line((36, -56.5), (36, 56.5))
            ThreePointArc((36, 56.5), (35.121320344, 58.621320344), (33, 59.5))
            Line((33, 59.5), (-33, 59.5))
            ThreePointArc((-33, 59.5), (-35.121320344, 58.621320344), (-36, 56.5))
        make_face()
        with BuildLine():
            Line((-35, 56.5), (-35, -56.5))
            ThreePointArc((-35, -56.5), (-34.414213562, -57.914213562), (-33, -58.5))
            Line((-33, -58.5), (33, -58.5))
            ThreePointArc((33, -58.5), (34.414213562, -57.914213562), (35, -56.5))
            Line((35, -56.5), (35, 56.5))
            ThreePointArc((35, 56.5), (34.414213562, 57.914213562), (33, 58.5))
            Line((33, 58.5), (-33, 58.5))
            ThreePointArc((-33, 58.5), (-34.414213562, 57.914213562), (-35, 56.5))
        make_face(mode=Mode.SUBTRACT)
    extrude(amount=BOSS_EXTRUDE4_DEPTH)


solid = part.part
